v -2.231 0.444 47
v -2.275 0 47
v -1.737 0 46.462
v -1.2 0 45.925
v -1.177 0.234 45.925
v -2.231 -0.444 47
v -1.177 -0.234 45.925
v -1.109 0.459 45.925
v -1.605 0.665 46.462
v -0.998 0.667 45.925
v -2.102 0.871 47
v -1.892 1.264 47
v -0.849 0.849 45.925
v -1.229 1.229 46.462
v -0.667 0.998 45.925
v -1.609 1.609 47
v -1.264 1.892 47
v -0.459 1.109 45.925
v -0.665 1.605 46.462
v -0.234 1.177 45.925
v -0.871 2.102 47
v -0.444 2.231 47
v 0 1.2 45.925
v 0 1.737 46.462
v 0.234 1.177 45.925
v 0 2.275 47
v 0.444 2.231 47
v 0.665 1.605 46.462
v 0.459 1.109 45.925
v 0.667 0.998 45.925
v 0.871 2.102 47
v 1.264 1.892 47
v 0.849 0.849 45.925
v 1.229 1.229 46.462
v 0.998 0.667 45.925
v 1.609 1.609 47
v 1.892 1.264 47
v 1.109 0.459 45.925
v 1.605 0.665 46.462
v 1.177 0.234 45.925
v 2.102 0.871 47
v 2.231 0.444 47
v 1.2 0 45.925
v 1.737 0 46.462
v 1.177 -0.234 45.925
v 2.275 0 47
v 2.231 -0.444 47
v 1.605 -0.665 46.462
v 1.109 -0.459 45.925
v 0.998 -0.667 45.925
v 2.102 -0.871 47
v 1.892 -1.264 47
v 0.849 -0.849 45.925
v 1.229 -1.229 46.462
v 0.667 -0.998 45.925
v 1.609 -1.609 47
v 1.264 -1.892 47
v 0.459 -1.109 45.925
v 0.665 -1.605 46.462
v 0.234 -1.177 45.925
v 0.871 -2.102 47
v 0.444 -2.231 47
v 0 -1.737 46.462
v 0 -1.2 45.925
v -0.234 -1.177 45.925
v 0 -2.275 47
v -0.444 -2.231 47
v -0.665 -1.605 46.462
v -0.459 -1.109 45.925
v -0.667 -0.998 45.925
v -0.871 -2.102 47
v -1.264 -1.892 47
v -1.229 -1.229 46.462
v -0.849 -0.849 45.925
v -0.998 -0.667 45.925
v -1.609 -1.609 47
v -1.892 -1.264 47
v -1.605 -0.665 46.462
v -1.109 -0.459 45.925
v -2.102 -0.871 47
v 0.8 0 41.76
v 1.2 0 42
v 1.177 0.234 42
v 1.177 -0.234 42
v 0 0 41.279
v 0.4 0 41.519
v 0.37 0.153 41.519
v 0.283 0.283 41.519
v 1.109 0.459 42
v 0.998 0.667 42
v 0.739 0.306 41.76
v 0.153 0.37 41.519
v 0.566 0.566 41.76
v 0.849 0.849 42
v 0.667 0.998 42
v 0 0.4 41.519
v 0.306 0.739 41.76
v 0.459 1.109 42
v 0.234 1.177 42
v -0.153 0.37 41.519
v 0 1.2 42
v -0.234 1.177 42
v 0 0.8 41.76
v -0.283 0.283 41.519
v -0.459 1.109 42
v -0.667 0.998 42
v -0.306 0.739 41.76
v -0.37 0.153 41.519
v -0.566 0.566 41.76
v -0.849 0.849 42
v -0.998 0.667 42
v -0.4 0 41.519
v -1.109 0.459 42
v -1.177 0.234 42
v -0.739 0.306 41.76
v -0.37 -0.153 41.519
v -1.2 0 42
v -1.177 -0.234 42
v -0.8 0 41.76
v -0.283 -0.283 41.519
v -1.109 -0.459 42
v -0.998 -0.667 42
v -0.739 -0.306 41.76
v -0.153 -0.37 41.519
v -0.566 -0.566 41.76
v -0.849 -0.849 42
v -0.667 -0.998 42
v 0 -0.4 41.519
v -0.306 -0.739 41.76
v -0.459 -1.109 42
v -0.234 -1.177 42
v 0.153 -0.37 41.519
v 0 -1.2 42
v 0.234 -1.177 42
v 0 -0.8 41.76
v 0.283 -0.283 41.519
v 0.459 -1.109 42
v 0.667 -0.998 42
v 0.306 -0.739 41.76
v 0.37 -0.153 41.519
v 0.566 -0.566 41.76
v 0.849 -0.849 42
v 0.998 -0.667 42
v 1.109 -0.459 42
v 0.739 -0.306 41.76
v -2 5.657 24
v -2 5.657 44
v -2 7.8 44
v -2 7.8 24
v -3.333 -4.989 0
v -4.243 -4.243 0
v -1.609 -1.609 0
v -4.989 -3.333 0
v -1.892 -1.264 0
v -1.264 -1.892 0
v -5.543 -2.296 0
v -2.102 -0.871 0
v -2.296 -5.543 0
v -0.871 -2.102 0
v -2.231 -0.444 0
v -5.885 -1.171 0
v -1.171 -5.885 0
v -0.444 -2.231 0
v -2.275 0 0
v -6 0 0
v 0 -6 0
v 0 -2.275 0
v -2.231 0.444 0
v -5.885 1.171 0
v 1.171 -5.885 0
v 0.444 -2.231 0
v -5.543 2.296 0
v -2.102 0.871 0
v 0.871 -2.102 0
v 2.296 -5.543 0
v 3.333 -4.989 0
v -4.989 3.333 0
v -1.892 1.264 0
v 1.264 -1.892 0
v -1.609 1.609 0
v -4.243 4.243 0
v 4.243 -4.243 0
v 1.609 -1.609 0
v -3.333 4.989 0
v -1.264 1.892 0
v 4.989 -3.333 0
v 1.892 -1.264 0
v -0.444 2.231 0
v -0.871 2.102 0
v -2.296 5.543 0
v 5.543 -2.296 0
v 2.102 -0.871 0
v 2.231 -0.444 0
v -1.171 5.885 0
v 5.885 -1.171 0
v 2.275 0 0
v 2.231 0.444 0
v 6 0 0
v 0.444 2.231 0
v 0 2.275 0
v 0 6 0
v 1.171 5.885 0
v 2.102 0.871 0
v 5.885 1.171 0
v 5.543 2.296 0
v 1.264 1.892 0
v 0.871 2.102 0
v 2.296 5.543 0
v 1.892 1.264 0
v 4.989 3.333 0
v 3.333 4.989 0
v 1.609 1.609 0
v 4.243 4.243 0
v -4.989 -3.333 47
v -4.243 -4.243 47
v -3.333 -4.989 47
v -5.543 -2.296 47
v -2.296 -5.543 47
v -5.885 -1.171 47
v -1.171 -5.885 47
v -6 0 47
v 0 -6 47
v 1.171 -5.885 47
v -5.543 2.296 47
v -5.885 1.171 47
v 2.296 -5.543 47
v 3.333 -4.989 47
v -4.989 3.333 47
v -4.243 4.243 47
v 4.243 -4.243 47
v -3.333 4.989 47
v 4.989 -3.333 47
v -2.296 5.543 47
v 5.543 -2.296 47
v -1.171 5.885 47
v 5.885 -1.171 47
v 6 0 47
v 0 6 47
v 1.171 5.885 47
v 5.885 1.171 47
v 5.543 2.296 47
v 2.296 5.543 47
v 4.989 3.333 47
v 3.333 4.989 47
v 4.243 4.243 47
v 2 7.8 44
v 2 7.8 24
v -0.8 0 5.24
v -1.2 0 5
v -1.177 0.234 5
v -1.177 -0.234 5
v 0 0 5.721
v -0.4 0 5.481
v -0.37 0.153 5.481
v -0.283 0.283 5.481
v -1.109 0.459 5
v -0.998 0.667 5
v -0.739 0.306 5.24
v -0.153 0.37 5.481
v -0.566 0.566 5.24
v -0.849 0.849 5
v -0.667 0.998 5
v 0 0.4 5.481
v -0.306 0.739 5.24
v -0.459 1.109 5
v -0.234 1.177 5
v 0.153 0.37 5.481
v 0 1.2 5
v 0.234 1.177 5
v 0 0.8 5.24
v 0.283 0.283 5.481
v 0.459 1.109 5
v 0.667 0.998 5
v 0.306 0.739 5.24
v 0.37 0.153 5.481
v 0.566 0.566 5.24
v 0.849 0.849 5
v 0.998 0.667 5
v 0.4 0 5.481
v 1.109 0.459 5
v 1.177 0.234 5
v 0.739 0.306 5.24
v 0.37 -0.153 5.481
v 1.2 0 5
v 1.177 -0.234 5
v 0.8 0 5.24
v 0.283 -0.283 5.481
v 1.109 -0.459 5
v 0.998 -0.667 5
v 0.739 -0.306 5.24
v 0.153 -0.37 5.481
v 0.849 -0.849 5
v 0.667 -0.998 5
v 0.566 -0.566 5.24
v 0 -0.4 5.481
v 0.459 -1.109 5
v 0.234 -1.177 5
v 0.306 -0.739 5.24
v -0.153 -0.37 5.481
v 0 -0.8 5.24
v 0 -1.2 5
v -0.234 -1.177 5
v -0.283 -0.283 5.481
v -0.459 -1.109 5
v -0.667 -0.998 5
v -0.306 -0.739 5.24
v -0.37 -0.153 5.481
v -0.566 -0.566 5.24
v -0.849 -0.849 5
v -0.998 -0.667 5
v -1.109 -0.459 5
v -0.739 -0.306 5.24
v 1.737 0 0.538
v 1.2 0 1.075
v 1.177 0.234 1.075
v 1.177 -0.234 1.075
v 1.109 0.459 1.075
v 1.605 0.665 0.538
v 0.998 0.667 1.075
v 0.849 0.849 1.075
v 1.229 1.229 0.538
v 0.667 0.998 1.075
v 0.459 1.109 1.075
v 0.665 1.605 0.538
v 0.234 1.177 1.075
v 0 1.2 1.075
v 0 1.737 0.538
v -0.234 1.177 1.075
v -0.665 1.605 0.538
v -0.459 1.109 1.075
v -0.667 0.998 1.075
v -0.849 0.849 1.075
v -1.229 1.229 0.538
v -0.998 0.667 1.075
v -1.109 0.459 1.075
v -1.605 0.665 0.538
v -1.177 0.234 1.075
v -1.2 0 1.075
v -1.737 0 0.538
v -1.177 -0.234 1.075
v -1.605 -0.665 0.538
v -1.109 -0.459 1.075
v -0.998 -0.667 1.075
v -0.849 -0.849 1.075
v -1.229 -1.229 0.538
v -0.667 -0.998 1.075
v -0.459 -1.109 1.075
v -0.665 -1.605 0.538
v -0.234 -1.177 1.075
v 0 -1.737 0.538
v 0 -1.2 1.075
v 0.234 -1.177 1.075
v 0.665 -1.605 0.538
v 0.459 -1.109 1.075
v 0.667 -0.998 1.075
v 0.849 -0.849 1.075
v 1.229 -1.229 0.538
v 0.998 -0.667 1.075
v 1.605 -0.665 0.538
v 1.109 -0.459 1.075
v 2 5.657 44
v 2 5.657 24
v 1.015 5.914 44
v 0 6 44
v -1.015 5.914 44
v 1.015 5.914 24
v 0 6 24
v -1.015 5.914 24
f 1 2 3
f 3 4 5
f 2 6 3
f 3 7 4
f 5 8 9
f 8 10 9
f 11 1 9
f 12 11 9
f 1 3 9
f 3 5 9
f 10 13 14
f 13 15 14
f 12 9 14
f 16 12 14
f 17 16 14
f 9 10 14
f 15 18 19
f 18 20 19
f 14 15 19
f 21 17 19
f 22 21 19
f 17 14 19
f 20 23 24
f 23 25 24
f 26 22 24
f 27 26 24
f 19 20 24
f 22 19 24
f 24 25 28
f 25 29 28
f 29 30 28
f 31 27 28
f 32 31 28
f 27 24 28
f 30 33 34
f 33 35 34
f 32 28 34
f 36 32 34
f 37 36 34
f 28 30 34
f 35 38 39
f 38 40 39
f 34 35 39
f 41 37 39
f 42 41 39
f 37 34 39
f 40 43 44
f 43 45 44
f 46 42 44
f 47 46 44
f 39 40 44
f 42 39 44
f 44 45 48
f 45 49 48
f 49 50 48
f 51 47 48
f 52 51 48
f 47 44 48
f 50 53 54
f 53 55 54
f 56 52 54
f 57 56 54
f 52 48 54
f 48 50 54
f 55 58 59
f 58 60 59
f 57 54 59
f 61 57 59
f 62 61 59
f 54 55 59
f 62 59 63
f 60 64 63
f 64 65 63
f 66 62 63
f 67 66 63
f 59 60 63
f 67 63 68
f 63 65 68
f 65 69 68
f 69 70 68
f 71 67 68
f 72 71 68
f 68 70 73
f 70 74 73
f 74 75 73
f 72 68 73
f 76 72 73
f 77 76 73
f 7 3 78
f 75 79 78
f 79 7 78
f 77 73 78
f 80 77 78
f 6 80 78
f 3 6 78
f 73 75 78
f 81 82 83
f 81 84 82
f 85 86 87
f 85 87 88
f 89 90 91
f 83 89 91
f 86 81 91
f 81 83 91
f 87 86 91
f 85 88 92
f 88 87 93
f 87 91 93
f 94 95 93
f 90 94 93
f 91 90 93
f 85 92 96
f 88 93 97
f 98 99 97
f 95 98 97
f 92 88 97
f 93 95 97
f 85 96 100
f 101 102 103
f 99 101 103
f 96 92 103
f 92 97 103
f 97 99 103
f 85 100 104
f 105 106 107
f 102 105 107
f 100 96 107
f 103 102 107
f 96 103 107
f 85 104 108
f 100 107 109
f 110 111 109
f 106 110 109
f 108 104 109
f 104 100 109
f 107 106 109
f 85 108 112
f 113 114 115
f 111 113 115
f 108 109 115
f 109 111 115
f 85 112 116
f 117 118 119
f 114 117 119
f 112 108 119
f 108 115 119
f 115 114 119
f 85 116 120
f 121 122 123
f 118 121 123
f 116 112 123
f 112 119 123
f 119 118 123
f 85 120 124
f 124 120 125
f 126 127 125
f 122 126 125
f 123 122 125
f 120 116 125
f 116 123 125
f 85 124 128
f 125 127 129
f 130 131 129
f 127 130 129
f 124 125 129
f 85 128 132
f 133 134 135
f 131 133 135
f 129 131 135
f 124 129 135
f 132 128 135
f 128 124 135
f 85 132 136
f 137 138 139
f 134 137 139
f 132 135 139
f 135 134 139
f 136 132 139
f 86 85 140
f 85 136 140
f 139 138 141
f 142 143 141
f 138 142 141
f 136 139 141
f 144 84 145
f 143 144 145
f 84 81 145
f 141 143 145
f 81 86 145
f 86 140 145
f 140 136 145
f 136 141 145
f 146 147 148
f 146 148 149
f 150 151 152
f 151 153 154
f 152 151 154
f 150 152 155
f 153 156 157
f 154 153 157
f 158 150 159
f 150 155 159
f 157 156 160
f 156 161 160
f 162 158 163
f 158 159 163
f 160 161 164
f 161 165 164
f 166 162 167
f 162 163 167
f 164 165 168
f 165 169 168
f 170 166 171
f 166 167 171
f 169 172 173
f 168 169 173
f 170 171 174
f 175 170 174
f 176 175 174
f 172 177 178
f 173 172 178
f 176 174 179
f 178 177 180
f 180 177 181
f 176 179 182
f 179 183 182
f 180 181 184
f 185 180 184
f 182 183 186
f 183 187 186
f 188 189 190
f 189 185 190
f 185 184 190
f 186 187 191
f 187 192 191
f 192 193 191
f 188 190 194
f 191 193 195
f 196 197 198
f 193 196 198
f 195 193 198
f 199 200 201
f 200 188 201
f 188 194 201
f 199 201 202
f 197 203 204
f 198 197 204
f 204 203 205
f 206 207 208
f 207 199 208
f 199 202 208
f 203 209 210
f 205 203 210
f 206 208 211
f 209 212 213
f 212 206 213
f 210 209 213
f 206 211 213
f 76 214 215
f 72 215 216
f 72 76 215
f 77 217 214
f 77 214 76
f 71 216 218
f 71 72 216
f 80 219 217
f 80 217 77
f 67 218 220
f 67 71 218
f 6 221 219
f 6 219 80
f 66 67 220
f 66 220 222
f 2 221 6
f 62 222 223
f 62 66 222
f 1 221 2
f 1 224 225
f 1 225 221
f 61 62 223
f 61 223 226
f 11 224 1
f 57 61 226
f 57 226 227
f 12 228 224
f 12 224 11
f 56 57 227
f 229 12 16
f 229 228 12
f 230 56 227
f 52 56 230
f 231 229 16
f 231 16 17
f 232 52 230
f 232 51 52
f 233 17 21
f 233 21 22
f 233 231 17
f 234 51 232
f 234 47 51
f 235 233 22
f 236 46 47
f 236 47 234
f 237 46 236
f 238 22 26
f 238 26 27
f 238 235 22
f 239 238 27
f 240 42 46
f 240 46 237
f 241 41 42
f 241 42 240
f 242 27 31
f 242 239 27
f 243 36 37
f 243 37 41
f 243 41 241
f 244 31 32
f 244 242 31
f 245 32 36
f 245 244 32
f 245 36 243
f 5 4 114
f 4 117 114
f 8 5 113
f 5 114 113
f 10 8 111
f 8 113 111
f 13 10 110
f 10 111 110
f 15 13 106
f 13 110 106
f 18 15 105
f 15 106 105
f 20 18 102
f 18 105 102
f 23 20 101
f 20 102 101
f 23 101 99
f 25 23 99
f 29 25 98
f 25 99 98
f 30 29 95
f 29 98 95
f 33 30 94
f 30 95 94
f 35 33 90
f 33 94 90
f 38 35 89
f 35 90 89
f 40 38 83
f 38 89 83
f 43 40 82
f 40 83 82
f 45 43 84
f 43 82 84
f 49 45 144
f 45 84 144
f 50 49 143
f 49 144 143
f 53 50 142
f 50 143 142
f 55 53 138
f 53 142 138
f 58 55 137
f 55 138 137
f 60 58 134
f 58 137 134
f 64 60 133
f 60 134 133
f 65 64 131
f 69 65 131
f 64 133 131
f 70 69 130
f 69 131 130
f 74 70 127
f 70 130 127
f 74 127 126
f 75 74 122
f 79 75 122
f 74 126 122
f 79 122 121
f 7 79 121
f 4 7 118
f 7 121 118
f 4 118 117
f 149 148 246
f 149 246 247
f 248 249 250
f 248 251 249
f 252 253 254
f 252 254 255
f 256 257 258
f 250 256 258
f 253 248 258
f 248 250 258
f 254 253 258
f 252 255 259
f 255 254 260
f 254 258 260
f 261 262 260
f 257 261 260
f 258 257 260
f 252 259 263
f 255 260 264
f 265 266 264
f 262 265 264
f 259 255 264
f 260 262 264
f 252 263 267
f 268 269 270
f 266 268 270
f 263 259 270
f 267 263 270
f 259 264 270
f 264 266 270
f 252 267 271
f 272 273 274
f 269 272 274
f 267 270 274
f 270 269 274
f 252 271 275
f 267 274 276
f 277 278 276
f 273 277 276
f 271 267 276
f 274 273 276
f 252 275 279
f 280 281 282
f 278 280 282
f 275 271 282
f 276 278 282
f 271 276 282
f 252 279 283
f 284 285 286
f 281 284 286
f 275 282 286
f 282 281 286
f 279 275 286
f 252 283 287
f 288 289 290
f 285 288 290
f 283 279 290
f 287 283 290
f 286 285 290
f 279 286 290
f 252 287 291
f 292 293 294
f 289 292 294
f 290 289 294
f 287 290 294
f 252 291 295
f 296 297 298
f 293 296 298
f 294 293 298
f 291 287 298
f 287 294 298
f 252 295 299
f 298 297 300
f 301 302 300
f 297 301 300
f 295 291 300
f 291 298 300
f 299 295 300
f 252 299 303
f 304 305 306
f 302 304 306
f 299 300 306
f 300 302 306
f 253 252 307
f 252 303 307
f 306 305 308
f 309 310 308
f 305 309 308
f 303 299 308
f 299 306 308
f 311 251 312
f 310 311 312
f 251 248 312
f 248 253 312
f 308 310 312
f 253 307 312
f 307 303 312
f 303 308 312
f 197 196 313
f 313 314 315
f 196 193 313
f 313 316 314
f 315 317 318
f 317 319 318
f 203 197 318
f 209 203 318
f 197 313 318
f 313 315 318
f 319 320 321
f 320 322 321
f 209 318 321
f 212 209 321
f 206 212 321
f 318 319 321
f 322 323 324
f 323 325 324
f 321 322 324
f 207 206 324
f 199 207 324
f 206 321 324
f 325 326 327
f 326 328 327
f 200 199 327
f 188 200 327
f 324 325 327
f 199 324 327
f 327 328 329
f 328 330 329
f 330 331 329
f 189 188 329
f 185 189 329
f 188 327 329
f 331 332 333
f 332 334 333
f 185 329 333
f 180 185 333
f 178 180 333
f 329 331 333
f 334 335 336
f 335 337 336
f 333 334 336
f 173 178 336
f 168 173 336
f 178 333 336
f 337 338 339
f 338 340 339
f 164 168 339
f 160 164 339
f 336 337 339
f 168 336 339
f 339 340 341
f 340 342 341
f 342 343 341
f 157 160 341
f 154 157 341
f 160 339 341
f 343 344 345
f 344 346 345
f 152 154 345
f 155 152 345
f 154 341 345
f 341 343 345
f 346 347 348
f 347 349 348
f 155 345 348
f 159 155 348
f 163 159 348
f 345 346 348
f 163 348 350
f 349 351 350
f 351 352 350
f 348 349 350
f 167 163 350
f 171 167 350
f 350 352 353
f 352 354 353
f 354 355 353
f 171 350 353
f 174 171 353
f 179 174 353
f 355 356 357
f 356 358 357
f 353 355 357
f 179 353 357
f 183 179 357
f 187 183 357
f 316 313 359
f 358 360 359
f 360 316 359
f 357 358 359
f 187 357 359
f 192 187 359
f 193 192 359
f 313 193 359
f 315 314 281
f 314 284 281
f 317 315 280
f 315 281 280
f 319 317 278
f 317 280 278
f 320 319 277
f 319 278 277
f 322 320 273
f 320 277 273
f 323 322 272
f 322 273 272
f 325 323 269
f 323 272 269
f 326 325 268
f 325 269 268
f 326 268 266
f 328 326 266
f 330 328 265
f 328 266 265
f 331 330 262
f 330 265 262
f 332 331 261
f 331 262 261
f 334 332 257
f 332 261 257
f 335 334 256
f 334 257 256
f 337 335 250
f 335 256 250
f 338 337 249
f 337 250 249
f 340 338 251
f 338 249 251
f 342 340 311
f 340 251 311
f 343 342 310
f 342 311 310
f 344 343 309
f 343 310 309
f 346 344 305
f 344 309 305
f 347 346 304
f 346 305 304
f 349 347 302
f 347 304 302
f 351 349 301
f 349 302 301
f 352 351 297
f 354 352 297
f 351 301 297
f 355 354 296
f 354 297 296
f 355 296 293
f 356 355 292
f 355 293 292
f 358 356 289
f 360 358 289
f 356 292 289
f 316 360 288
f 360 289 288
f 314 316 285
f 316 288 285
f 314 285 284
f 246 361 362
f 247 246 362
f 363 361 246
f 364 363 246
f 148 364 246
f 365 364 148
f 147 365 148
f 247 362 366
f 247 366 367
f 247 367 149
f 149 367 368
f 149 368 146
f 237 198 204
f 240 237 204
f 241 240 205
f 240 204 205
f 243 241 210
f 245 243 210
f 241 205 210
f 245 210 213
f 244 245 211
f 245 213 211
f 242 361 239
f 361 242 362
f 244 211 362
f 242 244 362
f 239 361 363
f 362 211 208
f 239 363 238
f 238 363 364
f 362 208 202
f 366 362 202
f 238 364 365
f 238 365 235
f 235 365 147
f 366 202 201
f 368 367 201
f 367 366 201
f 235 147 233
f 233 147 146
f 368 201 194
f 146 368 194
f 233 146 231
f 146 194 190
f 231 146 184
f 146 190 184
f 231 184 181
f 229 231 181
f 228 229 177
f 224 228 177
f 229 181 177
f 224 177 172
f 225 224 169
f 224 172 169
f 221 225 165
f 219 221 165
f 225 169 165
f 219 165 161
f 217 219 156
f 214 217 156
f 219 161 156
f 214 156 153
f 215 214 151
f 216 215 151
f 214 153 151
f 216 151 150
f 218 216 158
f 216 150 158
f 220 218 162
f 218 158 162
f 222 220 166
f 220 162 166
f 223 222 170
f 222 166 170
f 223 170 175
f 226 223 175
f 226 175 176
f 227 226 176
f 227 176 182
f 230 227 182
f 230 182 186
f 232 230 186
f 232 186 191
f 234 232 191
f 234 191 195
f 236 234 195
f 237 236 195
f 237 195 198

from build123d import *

# Parameters (mm, degrees)
SKETCH_1_R                   = 6
EXTRUDE_1_DEPTH              = 47
EXTRUDE_2_DEPTH              = 1.8
EXTRUDE_2_DEPTH_BACK         = 1.8
SKETCH_2_W                   = 20
SKETCH_2_H                   = 4
HOLE_WIZARD_M2_2_D           = 2.4
HOLE_WIZARD_M2_2_DEPTH       = 5
HOLE_WIZARD_M2_2_CSINK_D     = 4.55
HOLE_WIZARD_M2_2_CSINK_ANGLE = 90
HOLE_WIZARD_M2_2_TIP         = 0.721032743
HOLE_WIZARD_M2_3_D           = 2.4
HOLE_WIZARD_M2_3_DEPTH       = 5
HOLE_WIZARD_M2_3_CSINK_D     = 4.55
HOLE_WIZARD_M2_3_CSINK_ANGLE = 90
HOLE_WIZARD_M2_3_TIP         = 0.721032743


with BuildPart() as part:
    # 스케치1 → 보스-돌출1 (new body)
    with BuildSketch(Plane.XY):
        Circle(SKETCH_1_R)
    extrude(amount=EXTRUDE_1_DEPTH)

    # 스케치2 → 보스-돌출2 (add, two sides: drawn at the far end of the back side and taken through both)
    with BuildSketch(Plane(origin=(0, 6, 0), x_dir=(0, 0, -1), z_dir=(0, 1, 0)).offset(-EXTRUDE_2_DEPTH_BACK)):
        with Locations((-34, 0)):
            Rectangle(SKETCH_2_W, SKETCH_2_H)
    extrude(amount=EXTRUDE_2_DEPTH + EXTRUDE_2_DEPTH_BACK)

    # M2 여유 구멍2
    with Locations(Plane.XY.offset(47)):
        with Locations((0, 0)):
            CounterSinkHole(HOLE_WIZARD_M2_2_D / 2, HOLE_WIZARD_M2_2_CSINK_D / 2, depth=HOLE_WIZARD_M2_2_DEPTH, counter_sink_angle=HOLE_WIZARD_M2_2_CSINK_ANGLE)
            with Locations((0, 0, -(HOLE_WIZARD_M2_2_DEPTH + HOLE_WIZARD_M2_2_TIP / 2))):  # 118° drill point
                Cone(0, HOLE_WIZARD_M2_2_D / 2, HOLE_WIZARD_M2_2_TIP, mode=Mode.SUBTRACT)

    # M2 여유 구멍3
    with Locations(Plane(origin=(0, 0, 0), x_dir=(-1, 0, 0), z_dir=(0, 0, -1))):
        with Locations((0, 0)):
            CounterSinkHole(HOLE_WIZARD_M2_3_D / 2, HOLE_WIZARD_M2_3_CSINK_D / 2, depth=HOLE_WIZARD_M2_3_DEPTH, counter_sink_angle=HOLE_WIZARD_M2_3_CSINK_ANGLE)
            with Locations((0, 0, -(HOLE_WIZARD_M2_3_DEPTH + HOLE_WIZARD_M2_3_TIP / 2))):  # 118° drill point
                Cone(0, HOLE_WIZARD_M2_3_D / 2, HOLE_WIZARD_M2_3_TIP, mode=Mode.SUBTRACT)


solid = part.part
